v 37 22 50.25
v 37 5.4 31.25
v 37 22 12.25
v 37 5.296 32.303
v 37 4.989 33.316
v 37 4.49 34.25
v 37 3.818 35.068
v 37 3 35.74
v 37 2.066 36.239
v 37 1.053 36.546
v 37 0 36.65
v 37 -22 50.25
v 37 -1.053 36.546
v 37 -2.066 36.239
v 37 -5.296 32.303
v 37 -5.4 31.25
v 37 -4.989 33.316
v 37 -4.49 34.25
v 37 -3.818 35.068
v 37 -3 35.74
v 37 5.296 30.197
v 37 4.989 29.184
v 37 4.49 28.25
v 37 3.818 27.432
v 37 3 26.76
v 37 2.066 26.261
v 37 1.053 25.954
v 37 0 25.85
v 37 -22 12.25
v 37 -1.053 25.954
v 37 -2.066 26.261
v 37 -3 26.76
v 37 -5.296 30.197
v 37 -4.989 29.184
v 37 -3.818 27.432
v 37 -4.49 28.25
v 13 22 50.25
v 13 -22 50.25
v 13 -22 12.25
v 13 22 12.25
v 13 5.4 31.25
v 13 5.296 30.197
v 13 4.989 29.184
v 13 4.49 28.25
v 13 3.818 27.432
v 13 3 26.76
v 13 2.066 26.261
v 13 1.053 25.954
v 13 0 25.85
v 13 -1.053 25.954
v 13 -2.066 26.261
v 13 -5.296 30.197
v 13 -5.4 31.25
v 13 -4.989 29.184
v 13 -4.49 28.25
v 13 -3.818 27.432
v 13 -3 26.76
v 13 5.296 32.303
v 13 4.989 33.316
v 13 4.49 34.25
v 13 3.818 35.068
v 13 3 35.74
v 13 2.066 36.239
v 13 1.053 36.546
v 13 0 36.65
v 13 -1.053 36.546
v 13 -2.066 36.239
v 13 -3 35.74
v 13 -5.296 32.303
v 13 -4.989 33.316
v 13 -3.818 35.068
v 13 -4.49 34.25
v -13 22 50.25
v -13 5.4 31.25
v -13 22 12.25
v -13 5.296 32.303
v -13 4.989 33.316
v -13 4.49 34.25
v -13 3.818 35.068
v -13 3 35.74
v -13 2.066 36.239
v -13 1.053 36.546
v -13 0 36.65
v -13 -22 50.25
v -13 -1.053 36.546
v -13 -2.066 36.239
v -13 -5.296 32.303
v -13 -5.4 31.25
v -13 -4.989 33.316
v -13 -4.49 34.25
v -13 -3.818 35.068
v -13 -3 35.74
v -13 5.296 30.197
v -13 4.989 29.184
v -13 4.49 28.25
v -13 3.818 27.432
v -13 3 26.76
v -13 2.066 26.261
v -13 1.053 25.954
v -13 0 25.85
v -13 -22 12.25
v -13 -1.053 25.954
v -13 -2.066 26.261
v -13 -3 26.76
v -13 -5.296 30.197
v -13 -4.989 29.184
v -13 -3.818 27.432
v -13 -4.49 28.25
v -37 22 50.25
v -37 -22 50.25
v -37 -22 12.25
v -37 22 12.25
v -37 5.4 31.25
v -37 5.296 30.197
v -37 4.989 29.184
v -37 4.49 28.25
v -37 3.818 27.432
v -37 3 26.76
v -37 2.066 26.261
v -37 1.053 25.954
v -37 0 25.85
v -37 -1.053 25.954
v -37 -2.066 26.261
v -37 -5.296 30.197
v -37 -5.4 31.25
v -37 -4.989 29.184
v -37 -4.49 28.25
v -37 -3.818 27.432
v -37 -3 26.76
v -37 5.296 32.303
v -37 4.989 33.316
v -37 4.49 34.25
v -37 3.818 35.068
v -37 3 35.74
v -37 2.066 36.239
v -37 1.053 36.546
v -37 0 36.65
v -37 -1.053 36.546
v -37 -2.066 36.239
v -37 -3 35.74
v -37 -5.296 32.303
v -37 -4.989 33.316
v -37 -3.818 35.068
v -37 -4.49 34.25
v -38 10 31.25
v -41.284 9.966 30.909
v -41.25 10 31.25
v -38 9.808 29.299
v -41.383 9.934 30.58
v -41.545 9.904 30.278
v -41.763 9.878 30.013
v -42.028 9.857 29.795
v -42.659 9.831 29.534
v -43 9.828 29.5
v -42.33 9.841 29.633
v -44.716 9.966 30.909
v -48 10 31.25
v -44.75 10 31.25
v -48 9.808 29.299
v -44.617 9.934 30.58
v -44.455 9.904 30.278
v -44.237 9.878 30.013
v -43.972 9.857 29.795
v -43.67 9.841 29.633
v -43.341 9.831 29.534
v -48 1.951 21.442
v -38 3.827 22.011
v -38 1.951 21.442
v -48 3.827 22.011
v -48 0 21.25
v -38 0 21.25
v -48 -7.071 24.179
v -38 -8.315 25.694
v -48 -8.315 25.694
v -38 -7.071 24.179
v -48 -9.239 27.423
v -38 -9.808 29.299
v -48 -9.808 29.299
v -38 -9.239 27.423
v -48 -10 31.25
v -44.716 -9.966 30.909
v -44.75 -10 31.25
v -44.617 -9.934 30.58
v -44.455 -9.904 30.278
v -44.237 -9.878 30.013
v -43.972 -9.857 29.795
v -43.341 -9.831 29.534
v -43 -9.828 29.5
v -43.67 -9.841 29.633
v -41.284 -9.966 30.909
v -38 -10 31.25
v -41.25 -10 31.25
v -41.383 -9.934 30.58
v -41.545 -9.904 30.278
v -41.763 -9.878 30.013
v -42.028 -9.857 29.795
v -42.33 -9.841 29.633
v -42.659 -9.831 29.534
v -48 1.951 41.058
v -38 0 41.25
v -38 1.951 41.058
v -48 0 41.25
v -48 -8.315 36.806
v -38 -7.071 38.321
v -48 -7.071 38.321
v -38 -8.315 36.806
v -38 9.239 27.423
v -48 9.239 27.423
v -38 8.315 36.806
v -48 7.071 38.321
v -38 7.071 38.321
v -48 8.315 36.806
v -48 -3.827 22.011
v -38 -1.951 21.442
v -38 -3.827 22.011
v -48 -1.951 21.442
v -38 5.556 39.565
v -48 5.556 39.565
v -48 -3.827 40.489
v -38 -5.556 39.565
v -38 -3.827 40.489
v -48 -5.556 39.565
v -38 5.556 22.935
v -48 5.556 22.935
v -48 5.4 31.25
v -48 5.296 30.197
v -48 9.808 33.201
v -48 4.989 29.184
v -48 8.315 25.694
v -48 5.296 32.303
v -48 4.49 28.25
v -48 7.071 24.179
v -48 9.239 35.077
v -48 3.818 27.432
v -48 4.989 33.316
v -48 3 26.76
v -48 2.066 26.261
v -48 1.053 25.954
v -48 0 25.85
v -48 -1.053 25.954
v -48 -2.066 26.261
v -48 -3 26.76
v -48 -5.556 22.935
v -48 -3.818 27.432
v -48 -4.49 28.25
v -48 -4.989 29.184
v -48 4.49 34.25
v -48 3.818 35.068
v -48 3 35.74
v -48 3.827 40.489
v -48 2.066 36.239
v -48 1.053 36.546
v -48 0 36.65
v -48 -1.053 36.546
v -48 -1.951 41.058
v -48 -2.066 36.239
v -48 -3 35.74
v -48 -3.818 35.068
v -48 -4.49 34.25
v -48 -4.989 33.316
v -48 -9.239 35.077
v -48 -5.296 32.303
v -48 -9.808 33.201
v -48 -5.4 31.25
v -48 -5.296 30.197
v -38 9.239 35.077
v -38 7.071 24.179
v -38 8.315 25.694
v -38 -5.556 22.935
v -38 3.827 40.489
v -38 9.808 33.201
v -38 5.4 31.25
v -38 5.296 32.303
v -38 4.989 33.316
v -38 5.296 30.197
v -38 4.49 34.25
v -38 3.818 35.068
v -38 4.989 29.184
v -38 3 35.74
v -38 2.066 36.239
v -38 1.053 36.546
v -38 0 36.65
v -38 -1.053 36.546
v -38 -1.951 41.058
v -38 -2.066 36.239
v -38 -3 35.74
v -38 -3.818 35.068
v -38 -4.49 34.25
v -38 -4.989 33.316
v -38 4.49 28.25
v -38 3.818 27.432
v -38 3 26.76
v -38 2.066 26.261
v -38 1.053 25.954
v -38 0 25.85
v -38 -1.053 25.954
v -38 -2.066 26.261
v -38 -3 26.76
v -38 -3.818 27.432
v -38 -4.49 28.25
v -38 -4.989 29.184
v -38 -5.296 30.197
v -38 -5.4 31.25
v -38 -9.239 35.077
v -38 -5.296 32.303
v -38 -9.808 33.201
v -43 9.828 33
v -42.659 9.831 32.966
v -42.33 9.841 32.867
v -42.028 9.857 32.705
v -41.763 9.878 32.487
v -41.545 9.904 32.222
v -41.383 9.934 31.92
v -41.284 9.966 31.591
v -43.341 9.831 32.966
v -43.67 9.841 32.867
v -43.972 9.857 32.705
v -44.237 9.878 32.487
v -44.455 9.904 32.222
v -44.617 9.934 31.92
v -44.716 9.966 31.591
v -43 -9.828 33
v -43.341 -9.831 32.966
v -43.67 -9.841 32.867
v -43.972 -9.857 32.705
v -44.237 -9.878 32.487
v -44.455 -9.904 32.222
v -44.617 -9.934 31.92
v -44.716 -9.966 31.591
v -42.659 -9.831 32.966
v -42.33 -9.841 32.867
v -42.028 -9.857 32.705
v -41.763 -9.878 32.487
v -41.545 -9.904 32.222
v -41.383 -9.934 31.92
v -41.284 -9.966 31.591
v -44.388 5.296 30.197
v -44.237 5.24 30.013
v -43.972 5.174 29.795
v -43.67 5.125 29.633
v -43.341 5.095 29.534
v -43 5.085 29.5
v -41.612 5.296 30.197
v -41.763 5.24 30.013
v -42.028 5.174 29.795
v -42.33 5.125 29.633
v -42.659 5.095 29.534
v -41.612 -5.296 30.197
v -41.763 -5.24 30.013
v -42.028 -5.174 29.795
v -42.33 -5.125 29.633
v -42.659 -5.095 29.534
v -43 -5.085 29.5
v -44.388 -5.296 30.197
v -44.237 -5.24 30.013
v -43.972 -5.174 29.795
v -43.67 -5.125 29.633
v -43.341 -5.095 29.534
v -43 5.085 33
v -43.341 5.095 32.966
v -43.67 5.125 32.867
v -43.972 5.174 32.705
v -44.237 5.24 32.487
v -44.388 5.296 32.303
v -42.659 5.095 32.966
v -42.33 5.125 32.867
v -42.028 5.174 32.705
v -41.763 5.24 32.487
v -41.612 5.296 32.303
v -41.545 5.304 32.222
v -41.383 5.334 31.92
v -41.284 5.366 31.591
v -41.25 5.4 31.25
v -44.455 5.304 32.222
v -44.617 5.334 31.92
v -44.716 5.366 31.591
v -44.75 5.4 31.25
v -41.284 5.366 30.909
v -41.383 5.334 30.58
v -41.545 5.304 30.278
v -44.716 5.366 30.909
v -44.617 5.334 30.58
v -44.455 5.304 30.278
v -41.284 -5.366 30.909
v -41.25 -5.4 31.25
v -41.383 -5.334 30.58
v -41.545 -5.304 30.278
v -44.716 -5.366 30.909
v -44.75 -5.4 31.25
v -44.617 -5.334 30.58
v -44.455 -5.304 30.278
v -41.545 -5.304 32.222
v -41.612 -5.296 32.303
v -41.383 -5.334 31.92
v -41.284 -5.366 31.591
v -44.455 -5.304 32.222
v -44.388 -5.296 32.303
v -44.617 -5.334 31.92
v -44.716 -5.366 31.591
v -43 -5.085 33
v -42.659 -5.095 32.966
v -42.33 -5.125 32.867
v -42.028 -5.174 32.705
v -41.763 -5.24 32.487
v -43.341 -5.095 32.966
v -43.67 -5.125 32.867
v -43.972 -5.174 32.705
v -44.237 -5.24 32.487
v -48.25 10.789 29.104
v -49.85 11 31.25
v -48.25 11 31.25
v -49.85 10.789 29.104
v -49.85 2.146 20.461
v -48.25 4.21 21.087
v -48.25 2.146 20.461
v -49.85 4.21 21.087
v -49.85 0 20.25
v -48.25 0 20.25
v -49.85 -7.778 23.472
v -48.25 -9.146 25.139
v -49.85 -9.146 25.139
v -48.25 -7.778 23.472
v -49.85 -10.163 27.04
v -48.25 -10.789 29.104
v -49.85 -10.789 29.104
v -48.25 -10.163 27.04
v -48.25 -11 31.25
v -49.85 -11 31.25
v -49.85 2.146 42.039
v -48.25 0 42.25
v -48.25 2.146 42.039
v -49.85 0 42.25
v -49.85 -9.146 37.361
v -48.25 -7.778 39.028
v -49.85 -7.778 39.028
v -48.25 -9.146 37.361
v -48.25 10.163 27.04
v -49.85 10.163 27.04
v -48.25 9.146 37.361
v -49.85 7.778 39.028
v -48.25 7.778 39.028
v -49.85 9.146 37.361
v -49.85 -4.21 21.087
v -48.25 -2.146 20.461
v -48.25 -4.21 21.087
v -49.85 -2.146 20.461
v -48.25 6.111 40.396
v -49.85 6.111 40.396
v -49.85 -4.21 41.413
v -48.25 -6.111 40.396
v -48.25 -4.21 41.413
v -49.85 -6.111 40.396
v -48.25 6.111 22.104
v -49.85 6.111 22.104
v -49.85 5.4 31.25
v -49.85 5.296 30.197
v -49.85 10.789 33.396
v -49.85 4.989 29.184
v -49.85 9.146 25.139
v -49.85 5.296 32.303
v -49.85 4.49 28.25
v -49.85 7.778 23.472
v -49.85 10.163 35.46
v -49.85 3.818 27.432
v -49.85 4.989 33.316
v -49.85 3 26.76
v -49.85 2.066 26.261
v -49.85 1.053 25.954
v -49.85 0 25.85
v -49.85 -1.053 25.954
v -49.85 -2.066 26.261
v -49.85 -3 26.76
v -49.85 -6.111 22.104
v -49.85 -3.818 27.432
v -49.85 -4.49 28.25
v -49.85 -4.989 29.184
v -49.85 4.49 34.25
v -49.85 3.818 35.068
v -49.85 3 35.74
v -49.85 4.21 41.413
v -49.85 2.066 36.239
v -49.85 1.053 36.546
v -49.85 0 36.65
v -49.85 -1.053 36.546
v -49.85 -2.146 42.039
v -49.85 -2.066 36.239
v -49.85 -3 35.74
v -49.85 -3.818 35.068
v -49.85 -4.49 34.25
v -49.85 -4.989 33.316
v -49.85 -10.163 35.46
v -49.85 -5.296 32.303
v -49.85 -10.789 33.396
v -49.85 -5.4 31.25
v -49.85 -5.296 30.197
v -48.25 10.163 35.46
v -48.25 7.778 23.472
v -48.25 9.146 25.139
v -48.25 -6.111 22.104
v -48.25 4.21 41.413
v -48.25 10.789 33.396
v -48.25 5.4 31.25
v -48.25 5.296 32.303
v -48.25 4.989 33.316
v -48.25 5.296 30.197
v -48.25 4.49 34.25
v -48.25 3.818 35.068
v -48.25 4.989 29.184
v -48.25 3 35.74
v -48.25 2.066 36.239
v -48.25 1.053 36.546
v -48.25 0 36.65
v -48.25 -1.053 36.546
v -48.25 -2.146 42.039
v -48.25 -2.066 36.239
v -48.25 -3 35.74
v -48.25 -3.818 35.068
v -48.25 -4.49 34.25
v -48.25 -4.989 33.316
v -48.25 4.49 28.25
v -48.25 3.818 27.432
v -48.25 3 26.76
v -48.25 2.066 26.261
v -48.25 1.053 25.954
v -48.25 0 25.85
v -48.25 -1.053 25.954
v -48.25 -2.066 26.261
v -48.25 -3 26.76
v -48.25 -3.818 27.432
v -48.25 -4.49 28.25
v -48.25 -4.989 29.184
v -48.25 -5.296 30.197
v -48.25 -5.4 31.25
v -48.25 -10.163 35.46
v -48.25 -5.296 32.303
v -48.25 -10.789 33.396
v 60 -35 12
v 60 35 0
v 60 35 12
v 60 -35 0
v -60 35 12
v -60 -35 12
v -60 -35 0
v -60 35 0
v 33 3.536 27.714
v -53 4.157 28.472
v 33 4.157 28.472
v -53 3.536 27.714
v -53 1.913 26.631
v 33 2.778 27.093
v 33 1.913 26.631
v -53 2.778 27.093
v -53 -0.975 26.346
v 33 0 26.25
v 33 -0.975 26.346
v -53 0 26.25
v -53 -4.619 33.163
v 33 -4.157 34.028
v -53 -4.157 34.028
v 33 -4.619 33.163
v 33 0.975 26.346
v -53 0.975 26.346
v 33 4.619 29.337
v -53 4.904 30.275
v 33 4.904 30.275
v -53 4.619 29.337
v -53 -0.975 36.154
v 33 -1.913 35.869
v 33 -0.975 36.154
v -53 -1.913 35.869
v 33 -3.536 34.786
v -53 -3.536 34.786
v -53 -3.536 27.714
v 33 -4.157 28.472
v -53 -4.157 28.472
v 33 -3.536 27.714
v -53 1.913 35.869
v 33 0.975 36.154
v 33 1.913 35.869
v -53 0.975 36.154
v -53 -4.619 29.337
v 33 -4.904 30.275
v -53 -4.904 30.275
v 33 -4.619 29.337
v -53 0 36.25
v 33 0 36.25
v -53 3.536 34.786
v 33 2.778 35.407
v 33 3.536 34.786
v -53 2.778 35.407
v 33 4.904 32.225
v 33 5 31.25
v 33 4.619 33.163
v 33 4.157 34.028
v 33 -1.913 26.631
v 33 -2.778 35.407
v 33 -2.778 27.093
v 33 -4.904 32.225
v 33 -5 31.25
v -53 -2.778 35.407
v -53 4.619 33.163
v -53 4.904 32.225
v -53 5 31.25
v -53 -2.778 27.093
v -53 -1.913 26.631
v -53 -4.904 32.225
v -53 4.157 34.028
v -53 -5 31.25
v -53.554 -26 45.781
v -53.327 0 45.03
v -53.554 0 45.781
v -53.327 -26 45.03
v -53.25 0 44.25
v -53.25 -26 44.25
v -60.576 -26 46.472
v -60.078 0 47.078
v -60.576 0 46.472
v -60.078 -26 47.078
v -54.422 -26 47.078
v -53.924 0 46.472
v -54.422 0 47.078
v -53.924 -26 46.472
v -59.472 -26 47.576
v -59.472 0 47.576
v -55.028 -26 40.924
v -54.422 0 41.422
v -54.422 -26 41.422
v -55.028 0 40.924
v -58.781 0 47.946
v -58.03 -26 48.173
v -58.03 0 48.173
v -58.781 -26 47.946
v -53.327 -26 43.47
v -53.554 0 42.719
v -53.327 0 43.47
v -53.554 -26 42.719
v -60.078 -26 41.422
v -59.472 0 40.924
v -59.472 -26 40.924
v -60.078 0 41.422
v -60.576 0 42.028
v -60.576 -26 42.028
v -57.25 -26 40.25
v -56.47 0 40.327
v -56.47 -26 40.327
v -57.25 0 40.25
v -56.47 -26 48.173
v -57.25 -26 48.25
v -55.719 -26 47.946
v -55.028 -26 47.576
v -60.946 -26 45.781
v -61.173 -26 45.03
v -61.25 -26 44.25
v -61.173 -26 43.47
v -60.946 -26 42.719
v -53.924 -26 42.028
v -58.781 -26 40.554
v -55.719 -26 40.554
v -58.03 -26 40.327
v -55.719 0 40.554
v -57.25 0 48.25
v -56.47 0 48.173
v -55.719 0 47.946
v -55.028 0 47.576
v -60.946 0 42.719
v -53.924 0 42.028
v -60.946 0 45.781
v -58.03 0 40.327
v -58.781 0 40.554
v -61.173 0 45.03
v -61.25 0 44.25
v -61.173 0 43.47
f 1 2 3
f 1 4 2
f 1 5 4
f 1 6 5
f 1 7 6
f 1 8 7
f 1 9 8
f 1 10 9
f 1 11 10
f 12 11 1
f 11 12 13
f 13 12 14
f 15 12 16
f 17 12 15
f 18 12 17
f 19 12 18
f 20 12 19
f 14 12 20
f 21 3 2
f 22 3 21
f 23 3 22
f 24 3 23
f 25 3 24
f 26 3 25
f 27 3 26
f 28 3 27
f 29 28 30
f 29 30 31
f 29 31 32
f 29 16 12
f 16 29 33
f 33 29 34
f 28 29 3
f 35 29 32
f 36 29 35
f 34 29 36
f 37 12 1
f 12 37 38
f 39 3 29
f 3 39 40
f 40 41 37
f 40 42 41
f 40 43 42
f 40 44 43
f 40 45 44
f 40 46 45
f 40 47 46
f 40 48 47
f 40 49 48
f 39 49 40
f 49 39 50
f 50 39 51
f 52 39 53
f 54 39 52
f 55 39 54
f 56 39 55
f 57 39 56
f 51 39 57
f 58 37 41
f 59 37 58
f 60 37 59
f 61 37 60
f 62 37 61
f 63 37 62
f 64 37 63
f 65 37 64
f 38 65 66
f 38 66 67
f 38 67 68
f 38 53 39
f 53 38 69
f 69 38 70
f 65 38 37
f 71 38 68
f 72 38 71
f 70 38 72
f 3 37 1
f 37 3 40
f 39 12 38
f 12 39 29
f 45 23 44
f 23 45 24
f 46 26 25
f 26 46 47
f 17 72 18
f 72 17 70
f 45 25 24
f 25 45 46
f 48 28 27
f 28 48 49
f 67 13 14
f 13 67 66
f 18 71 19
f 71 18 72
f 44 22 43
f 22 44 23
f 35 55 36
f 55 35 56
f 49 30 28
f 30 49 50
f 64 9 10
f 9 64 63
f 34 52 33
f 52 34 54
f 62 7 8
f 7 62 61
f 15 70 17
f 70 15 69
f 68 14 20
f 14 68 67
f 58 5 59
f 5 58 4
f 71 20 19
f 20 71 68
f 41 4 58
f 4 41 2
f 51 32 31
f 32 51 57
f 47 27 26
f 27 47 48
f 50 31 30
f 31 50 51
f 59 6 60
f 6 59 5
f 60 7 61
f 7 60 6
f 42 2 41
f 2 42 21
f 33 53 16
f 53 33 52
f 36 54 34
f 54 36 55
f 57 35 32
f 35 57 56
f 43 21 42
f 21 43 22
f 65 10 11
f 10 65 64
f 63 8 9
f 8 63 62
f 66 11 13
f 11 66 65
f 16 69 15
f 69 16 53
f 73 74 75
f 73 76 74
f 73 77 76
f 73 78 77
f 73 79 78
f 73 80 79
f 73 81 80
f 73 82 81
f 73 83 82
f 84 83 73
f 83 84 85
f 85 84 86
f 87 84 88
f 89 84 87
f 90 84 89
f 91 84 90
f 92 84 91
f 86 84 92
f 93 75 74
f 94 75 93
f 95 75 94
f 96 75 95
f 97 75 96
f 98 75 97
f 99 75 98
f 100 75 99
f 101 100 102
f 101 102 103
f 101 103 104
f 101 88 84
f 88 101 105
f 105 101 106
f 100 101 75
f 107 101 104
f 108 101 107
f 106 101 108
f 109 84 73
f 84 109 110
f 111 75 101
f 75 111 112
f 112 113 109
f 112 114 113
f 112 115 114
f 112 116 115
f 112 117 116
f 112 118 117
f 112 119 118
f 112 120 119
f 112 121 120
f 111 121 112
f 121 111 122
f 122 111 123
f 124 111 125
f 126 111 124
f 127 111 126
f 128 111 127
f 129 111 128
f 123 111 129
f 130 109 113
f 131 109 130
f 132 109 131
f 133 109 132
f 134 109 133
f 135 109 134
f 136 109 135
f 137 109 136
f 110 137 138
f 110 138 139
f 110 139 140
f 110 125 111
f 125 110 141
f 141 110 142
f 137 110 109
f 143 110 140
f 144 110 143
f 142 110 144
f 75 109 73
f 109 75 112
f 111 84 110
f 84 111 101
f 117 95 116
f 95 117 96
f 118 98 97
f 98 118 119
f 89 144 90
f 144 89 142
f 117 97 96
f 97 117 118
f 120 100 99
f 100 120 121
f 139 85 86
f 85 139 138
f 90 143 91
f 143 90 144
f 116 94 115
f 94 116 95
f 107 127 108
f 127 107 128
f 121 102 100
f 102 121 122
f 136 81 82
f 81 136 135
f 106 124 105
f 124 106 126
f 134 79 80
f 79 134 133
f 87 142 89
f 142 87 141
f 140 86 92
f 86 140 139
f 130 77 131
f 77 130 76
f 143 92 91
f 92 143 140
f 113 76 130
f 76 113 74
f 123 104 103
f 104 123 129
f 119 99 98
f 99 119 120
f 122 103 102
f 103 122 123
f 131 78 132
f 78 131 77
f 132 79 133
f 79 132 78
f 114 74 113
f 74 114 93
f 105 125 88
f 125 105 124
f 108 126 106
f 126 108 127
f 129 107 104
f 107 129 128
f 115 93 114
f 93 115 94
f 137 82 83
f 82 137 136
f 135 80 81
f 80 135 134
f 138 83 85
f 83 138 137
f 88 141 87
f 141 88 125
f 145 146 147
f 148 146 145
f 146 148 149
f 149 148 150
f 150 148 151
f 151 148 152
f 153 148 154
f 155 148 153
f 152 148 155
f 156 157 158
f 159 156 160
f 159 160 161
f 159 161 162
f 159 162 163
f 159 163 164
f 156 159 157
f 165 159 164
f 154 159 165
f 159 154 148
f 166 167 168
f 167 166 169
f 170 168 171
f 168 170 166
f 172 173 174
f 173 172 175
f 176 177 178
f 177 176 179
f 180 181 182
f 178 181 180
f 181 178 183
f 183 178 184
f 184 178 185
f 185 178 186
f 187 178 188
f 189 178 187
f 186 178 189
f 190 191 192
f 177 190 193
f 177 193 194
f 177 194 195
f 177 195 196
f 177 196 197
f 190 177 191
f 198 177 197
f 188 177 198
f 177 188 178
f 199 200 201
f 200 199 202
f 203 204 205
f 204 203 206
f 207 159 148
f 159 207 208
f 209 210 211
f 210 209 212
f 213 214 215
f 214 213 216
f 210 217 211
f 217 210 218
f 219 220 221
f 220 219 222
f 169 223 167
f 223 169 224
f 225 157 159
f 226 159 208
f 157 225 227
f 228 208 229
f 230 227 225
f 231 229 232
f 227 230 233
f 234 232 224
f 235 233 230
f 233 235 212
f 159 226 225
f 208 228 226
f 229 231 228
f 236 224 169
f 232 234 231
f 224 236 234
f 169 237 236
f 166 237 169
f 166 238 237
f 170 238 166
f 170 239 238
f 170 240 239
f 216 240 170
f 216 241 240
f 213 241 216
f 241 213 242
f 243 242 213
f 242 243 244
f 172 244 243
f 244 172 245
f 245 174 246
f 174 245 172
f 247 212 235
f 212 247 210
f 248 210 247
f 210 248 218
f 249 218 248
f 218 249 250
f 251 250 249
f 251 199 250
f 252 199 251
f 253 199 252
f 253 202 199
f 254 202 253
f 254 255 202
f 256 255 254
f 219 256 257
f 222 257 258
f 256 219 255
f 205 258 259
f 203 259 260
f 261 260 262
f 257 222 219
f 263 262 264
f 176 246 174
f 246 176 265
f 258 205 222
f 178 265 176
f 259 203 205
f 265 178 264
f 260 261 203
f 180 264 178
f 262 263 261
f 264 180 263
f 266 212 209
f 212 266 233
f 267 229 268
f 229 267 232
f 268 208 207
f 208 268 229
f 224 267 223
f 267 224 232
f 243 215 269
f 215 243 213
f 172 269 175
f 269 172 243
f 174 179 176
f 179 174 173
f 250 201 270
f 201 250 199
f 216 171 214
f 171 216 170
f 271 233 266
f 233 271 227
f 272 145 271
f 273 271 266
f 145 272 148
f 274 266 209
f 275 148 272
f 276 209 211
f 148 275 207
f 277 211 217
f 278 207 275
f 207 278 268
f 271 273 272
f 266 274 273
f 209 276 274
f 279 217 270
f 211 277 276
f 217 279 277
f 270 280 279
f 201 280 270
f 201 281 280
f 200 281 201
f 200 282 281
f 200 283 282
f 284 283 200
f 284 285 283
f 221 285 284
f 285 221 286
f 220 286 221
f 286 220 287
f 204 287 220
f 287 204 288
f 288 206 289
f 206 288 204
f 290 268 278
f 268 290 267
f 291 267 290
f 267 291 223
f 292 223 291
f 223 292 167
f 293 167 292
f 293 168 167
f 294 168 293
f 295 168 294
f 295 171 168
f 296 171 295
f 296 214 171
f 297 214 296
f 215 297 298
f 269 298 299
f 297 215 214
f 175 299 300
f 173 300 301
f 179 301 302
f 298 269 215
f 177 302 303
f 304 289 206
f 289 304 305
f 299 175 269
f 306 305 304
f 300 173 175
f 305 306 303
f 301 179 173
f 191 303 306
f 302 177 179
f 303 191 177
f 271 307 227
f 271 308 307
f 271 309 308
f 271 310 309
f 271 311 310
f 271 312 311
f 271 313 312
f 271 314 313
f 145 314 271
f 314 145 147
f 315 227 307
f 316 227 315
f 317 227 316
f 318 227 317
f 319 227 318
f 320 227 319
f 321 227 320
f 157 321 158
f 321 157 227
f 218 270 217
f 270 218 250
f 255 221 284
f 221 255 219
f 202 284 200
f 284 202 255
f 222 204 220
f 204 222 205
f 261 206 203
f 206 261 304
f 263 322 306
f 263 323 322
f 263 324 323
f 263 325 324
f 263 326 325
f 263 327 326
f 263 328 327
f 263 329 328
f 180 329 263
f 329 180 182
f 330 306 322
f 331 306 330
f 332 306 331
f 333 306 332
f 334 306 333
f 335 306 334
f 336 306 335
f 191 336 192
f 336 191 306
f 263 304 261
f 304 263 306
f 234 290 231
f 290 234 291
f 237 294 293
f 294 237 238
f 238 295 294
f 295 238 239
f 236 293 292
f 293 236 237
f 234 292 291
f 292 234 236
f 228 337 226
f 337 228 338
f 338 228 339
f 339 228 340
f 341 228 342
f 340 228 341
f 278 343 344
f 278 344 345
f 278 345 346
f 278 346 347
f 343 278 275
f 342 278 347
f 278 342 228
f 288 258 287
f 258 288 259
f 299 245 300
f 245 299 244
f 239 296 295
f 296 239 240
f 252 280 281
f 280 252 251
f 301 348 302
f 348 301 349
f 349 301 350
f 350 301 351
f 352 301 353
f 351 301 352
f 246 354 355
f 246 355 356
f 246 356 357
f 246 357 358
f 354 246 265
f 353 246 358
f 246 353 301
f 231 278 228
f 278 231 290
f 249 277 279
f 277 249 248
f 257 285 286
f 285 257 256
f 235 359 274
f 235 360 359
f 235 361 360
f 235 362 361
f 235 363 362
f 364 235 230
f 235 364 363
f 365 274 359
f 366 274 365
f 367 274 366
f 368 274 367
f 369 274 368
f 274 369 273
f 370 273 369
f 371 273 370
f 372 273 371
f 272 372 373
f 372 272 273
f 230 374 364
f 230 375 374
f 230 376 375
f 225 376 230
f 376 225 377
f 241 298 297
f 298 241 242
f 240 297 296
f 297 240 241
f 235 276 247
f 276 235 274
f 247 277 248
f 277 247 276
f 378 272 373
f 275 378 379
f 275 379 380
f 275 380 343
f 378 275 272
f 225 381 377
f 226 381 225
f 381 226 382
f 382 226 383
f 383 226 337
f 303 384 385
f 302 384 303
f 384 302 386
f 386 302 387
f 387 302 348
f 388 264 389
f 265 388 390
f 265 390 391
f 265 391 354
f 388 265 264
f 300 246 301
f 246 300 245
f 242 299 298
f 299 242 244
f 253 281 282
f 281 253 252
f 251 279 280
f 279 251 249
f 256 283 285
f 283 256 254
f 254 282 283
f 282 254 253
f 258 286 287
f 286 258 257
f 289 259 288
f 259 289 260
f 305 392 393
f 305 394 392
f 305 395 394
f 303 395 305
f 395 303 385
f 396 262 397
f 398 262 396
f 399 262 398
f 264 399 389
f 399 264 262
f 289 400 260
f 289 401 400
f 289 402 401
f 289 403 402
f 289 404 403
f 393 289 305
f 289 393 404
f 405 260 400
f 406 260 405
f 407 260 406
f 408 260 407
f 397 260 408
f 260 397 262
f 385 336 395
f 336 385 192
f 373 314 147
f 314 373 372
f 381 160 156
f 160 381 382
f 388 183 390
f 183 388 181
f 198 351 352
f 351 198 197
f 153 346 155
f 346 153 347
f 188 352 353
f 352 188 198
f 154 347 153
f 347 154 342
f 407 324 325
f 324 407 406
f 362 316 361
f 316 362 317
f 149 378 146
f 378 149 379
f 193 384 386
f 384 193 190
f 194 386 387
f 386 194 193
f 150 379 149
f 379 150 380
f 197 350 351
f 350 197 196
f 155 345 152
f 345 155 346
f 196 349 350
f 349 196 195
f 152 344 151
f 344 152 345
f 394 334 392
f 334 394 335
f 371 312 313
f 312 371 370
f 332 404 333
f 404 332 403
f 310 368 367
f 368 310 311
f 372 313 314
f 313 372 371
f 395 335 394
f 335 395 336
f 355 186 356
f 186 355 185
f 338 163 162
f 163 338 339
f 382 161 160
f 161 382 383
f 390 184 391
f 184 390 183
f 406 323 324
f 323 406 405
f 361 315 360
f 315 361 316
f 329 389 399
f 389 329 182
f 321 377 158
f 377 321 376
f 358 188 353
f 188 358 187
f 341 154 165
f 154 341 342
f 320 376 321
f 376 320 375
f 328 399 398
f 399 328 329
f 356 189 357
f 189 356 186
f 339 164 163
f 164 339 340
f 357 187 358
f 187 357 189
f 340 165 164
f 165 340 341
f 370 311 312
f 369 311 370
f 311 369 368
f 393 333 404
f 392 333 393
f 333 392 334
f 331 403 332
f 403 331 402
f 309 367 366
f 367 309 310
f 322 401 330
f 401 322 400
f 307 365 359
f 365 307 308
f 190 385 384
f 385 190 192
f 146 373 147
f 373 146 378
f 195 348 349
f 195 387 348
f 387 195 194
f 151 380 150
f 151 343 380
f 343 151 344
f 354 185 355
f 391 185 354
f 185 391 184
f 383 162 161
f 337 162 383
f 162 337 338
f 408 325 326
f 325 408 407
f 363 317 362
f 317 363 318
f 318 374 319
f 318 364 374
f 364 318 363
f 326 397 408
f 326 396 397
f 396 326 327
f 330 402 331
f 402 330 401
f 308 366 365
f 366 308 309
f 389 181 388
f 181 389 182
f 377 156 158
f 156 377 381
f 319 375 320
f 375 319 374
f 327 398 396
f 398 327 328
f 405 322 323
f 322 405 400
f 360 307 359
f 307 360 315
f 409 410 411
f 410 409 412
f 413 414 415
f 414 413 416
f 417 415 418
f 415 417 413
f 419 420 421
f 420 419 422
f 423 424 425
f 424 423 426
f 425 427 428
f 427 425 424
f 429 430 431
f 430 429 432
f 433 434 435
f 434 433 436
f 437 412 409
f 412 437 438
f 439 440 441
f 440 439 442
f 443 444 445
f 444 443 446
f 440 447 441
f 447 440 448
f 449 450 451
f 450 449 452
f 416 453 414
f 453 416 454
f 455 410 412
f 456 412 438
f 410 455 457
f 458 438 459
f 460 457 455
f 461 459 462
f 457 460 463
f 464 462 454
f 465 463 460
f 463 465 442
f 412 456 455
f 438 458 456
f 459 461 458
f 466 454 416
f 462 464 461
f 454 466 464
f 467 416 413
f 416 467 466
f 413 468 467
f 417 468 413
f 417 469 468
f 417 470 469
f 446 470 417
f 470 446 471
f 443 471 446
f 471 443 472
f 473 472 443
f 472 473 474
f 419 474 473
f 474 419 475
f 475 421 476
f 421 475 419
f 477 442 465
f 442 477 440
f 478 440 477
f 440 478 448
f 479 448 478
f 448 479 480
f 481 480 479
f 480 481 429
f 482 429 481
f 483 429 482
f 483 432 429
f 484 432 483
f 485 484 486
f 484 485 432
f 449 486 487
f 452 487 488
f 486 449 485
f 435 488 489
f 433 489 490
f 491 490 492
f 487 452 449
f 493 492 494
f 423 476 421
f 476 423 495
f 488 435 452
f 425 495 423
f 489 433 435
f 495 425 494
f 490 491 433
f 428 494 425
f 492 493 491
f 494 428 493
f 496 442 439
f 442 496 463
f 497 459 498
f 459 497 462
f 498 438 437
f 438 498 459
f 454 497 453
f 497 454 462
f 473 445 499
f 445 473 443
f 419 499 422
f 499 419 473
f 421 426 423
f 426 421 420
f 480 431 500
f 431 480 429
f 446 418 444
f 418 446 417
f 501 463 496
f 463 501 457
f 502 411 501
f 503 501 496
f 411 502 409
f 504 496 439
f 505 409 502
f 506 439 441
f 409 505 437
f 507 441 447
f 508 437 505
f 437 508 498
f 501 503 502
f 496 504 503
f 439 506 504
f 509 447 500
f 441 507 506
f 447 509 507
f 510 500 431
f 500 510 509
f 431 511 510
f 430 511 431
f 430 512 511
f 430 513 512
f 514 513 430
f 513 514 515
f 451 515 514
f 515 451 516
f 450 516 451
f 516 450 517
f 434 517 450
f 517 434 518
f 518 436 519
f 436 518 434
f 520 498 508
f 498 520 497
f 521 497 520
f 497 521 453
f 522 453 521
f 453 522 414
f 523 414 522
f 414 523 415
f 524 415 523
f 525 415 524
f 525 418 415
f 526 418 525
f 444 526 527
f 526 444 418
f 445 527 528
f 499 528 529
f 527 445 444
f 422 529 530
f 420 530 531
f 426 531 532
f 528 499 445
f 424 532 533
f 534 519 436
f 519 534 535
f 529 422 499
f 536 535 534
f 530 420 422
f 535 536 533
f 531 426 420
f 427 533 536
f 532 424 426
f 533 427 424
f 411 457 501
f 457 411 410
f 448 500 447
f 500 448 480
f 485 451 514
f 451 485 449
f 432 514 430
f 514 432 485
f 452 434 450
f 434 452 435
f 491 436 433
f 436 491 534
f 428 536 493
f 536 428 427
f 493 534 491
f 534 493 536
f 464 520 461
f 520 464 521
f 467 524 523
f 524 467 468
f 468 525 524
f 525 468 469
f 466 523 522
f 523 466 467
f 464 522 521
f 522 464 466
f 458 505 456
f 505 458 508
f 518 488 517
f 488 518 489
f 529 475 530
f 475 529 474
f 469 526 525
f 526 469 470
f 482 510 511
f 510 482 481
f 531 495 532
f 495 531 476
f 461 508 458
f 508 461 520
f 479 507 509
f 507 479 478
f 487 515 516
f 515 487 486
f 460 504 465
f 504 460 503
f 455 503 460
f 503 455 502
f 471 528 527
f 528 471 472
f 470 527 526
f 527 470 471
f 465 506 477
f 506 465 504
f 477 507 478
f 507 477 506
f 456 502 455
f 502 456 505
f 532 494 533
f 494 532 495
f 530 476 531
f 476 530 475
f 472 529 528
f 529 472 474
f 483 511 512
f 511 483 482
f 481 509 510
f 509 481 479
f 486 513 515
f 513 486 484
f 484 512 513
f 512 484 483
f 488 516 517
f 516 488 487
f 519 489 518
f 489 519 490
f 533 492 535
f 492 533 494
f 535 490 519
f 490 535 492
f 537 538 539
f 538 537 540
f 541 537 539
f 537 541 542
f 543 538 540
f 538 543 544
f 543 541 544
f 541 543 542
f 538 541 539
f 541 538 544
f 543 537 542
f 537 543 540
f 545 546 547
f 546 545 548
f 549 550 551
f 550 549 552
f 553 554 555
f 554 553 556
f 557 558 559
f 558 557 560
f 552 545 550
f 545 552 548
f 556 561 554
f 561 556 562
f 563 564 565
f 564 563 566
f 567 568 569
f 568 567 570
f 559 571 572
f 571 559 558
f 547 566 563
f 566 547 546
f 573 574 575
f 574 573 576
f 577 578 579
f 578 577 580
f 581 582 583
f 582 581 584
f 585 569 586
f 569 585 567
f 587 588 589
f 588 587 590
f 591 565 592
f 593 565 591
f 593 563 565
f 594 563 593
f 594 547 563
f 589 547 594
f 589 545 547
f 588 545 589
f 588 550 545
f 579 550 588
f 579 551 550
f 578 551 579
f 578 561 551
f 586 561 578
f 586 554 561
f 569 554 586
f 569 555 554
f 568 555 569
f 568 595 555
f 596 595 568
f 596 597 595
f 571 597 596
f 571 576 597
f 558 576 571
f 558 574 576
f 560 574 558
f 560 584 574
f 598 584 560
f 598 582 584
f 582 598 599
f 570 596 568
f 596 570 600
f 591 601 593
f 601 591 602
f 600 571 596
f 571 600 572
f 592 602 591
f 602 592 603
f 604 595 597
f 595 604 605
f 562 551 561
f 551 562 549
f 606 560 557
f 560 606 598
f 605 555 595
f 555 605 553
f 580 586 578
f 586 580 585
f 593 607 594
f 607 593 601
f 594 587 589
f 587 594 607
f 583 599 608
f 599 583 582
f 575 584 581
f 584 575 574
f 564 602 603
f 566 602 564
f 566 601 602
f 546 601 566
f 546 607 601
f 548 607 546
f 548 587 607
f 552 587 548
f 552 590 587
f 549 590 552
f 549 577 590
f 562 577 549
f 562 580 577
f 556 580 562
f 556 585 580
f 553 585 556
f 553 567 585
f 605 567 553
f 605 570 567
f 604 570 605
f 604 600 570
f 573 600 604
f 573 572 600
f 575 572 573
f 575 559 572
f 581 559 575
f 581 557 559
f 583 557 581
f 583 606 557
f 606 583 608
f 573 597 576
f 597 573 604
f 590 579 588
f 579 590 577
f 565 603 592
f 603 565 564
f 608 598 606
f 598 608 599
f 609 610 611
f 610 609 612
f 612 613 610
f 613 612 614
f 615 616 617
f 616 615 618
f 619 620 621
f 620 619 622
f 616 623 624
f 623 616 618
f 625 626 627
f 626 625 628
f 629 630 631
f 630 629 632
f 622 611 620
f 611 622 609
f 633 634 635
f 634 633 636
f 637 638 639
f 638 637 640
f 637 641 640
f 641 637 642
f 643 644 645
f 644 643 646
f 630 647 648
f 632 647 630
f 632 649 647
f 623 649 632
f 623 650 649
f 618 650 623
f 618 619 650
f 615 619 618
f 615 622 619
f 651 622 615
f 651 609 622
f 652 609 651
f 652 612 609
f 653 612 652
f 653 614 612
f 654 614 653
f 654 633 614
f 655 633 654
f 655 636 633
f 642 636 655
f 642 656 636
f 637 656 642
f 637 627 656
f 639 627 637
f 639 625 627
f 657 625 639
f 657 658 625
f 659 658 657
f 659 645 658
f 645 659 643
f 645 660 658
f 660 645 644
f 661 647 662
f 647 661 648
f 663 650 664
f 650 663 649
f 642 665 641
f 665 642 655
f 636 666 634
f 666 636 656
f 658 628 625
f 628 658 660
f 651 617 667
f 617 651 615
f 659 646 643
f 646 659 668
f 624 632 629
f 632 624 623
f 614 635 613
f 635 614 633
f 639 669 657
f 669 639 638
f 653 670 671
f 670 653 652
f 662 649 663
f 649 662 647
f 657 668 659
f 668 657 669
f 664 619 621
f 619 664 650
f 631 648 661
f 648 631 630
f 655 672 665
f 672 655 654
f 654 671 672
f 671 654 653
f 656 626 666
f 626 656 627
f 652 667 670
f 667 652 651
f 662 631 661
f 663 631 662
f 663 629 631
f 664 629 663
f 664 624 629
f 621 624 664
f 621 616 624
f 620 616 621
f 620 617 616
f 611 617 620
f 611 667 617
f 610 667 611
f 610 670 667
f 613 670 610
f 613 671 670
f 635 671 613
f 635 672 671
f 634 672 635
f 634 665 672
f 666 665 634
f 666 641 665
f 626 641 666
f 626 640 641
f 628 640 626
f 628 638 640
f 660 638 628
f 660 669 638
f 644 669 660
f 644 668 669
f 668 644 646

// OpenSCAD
$fn = 32;

// ------------------------------------------------------------------------
// Machine vise: screw d10, jaws 24 x 38 mm
// Every part is its own module, assembly() places every instance.
// ------------------------------------------------------------------------

// --- part 1 ---
module vise_bed() {
  difference() {
    translate([-60, -35, 0]) cube([120, 70, 12]);
  }
}

// --- part 2 ---
module vise_jaw() {
  difference() {
    translate([-12, -22, 0]) cube([24, 44, 38]);
    translate([0, 0, 19]) rotate([0, 90, 0]) cylinder(h = 26, d = 10.8, center = true);
  }
}

// --- part 3 ---
module vise_screw() {
  translate([0, 0, -43]) cylinder(h = 86, d = 10);
}

// --- part 4 ---
module screw_collar() {
  difference() {
    cylinder(h = 10, d = 20);
    translate([0, 0, -1]) cylinder(h = 12, d = 10.8);
    translate([0, 0, 5]) rotate([90, 0, 0]) cylinder(h = 22, d = 3.5, center = true);
  }
}

// --- part 5 ---
module screw_washer() {
  difference() {
      translate([0, 0, 0]) cylinder(h = 1.6, d = 22);
      translate([0, 0, -1]) cylinder(h = 3.6, d = 10.8);
    }
}

// --- part 6 ---
module vise_handle() {
  cylinder(h = 26, d = 8);
}

// --- assembly ---
module assembly() {
  color([0.80, 0.24, 0.20]) translate([0, 0, 0]) rotate([0, 0, 0]) vise_bed();
  color([0.20, 0.45, 0.75]) translate([25, 0, 12.25]) rotate([0, 0, 0]) vise_jaw();
  color([0.25, 0.62, 0.32]) translate([-25, 0, 12.25]) rotate([0, 0, 0]) vise_jaw();
  color([0.92, 0.70, 0.18]) translate([-10, 0, 31.25]) rotate([0, 90, 0]) vise_screw();
  color([0.58, 0.35, 0.70]) translate([-48, 0, 31.25]) rotate([0, 90, 0]) screw_collar();
  color([0.16, 0.66, 0.66]) translate([-49.85, 0, 31.25]) rotate([0, 90, 0]) screw_washer();
  color([0.85, 0.48, 0.18]) translate([-57.25, 0, 44.25]) rotate([90, 0, 0]) vise_handle();
}

assembly();
